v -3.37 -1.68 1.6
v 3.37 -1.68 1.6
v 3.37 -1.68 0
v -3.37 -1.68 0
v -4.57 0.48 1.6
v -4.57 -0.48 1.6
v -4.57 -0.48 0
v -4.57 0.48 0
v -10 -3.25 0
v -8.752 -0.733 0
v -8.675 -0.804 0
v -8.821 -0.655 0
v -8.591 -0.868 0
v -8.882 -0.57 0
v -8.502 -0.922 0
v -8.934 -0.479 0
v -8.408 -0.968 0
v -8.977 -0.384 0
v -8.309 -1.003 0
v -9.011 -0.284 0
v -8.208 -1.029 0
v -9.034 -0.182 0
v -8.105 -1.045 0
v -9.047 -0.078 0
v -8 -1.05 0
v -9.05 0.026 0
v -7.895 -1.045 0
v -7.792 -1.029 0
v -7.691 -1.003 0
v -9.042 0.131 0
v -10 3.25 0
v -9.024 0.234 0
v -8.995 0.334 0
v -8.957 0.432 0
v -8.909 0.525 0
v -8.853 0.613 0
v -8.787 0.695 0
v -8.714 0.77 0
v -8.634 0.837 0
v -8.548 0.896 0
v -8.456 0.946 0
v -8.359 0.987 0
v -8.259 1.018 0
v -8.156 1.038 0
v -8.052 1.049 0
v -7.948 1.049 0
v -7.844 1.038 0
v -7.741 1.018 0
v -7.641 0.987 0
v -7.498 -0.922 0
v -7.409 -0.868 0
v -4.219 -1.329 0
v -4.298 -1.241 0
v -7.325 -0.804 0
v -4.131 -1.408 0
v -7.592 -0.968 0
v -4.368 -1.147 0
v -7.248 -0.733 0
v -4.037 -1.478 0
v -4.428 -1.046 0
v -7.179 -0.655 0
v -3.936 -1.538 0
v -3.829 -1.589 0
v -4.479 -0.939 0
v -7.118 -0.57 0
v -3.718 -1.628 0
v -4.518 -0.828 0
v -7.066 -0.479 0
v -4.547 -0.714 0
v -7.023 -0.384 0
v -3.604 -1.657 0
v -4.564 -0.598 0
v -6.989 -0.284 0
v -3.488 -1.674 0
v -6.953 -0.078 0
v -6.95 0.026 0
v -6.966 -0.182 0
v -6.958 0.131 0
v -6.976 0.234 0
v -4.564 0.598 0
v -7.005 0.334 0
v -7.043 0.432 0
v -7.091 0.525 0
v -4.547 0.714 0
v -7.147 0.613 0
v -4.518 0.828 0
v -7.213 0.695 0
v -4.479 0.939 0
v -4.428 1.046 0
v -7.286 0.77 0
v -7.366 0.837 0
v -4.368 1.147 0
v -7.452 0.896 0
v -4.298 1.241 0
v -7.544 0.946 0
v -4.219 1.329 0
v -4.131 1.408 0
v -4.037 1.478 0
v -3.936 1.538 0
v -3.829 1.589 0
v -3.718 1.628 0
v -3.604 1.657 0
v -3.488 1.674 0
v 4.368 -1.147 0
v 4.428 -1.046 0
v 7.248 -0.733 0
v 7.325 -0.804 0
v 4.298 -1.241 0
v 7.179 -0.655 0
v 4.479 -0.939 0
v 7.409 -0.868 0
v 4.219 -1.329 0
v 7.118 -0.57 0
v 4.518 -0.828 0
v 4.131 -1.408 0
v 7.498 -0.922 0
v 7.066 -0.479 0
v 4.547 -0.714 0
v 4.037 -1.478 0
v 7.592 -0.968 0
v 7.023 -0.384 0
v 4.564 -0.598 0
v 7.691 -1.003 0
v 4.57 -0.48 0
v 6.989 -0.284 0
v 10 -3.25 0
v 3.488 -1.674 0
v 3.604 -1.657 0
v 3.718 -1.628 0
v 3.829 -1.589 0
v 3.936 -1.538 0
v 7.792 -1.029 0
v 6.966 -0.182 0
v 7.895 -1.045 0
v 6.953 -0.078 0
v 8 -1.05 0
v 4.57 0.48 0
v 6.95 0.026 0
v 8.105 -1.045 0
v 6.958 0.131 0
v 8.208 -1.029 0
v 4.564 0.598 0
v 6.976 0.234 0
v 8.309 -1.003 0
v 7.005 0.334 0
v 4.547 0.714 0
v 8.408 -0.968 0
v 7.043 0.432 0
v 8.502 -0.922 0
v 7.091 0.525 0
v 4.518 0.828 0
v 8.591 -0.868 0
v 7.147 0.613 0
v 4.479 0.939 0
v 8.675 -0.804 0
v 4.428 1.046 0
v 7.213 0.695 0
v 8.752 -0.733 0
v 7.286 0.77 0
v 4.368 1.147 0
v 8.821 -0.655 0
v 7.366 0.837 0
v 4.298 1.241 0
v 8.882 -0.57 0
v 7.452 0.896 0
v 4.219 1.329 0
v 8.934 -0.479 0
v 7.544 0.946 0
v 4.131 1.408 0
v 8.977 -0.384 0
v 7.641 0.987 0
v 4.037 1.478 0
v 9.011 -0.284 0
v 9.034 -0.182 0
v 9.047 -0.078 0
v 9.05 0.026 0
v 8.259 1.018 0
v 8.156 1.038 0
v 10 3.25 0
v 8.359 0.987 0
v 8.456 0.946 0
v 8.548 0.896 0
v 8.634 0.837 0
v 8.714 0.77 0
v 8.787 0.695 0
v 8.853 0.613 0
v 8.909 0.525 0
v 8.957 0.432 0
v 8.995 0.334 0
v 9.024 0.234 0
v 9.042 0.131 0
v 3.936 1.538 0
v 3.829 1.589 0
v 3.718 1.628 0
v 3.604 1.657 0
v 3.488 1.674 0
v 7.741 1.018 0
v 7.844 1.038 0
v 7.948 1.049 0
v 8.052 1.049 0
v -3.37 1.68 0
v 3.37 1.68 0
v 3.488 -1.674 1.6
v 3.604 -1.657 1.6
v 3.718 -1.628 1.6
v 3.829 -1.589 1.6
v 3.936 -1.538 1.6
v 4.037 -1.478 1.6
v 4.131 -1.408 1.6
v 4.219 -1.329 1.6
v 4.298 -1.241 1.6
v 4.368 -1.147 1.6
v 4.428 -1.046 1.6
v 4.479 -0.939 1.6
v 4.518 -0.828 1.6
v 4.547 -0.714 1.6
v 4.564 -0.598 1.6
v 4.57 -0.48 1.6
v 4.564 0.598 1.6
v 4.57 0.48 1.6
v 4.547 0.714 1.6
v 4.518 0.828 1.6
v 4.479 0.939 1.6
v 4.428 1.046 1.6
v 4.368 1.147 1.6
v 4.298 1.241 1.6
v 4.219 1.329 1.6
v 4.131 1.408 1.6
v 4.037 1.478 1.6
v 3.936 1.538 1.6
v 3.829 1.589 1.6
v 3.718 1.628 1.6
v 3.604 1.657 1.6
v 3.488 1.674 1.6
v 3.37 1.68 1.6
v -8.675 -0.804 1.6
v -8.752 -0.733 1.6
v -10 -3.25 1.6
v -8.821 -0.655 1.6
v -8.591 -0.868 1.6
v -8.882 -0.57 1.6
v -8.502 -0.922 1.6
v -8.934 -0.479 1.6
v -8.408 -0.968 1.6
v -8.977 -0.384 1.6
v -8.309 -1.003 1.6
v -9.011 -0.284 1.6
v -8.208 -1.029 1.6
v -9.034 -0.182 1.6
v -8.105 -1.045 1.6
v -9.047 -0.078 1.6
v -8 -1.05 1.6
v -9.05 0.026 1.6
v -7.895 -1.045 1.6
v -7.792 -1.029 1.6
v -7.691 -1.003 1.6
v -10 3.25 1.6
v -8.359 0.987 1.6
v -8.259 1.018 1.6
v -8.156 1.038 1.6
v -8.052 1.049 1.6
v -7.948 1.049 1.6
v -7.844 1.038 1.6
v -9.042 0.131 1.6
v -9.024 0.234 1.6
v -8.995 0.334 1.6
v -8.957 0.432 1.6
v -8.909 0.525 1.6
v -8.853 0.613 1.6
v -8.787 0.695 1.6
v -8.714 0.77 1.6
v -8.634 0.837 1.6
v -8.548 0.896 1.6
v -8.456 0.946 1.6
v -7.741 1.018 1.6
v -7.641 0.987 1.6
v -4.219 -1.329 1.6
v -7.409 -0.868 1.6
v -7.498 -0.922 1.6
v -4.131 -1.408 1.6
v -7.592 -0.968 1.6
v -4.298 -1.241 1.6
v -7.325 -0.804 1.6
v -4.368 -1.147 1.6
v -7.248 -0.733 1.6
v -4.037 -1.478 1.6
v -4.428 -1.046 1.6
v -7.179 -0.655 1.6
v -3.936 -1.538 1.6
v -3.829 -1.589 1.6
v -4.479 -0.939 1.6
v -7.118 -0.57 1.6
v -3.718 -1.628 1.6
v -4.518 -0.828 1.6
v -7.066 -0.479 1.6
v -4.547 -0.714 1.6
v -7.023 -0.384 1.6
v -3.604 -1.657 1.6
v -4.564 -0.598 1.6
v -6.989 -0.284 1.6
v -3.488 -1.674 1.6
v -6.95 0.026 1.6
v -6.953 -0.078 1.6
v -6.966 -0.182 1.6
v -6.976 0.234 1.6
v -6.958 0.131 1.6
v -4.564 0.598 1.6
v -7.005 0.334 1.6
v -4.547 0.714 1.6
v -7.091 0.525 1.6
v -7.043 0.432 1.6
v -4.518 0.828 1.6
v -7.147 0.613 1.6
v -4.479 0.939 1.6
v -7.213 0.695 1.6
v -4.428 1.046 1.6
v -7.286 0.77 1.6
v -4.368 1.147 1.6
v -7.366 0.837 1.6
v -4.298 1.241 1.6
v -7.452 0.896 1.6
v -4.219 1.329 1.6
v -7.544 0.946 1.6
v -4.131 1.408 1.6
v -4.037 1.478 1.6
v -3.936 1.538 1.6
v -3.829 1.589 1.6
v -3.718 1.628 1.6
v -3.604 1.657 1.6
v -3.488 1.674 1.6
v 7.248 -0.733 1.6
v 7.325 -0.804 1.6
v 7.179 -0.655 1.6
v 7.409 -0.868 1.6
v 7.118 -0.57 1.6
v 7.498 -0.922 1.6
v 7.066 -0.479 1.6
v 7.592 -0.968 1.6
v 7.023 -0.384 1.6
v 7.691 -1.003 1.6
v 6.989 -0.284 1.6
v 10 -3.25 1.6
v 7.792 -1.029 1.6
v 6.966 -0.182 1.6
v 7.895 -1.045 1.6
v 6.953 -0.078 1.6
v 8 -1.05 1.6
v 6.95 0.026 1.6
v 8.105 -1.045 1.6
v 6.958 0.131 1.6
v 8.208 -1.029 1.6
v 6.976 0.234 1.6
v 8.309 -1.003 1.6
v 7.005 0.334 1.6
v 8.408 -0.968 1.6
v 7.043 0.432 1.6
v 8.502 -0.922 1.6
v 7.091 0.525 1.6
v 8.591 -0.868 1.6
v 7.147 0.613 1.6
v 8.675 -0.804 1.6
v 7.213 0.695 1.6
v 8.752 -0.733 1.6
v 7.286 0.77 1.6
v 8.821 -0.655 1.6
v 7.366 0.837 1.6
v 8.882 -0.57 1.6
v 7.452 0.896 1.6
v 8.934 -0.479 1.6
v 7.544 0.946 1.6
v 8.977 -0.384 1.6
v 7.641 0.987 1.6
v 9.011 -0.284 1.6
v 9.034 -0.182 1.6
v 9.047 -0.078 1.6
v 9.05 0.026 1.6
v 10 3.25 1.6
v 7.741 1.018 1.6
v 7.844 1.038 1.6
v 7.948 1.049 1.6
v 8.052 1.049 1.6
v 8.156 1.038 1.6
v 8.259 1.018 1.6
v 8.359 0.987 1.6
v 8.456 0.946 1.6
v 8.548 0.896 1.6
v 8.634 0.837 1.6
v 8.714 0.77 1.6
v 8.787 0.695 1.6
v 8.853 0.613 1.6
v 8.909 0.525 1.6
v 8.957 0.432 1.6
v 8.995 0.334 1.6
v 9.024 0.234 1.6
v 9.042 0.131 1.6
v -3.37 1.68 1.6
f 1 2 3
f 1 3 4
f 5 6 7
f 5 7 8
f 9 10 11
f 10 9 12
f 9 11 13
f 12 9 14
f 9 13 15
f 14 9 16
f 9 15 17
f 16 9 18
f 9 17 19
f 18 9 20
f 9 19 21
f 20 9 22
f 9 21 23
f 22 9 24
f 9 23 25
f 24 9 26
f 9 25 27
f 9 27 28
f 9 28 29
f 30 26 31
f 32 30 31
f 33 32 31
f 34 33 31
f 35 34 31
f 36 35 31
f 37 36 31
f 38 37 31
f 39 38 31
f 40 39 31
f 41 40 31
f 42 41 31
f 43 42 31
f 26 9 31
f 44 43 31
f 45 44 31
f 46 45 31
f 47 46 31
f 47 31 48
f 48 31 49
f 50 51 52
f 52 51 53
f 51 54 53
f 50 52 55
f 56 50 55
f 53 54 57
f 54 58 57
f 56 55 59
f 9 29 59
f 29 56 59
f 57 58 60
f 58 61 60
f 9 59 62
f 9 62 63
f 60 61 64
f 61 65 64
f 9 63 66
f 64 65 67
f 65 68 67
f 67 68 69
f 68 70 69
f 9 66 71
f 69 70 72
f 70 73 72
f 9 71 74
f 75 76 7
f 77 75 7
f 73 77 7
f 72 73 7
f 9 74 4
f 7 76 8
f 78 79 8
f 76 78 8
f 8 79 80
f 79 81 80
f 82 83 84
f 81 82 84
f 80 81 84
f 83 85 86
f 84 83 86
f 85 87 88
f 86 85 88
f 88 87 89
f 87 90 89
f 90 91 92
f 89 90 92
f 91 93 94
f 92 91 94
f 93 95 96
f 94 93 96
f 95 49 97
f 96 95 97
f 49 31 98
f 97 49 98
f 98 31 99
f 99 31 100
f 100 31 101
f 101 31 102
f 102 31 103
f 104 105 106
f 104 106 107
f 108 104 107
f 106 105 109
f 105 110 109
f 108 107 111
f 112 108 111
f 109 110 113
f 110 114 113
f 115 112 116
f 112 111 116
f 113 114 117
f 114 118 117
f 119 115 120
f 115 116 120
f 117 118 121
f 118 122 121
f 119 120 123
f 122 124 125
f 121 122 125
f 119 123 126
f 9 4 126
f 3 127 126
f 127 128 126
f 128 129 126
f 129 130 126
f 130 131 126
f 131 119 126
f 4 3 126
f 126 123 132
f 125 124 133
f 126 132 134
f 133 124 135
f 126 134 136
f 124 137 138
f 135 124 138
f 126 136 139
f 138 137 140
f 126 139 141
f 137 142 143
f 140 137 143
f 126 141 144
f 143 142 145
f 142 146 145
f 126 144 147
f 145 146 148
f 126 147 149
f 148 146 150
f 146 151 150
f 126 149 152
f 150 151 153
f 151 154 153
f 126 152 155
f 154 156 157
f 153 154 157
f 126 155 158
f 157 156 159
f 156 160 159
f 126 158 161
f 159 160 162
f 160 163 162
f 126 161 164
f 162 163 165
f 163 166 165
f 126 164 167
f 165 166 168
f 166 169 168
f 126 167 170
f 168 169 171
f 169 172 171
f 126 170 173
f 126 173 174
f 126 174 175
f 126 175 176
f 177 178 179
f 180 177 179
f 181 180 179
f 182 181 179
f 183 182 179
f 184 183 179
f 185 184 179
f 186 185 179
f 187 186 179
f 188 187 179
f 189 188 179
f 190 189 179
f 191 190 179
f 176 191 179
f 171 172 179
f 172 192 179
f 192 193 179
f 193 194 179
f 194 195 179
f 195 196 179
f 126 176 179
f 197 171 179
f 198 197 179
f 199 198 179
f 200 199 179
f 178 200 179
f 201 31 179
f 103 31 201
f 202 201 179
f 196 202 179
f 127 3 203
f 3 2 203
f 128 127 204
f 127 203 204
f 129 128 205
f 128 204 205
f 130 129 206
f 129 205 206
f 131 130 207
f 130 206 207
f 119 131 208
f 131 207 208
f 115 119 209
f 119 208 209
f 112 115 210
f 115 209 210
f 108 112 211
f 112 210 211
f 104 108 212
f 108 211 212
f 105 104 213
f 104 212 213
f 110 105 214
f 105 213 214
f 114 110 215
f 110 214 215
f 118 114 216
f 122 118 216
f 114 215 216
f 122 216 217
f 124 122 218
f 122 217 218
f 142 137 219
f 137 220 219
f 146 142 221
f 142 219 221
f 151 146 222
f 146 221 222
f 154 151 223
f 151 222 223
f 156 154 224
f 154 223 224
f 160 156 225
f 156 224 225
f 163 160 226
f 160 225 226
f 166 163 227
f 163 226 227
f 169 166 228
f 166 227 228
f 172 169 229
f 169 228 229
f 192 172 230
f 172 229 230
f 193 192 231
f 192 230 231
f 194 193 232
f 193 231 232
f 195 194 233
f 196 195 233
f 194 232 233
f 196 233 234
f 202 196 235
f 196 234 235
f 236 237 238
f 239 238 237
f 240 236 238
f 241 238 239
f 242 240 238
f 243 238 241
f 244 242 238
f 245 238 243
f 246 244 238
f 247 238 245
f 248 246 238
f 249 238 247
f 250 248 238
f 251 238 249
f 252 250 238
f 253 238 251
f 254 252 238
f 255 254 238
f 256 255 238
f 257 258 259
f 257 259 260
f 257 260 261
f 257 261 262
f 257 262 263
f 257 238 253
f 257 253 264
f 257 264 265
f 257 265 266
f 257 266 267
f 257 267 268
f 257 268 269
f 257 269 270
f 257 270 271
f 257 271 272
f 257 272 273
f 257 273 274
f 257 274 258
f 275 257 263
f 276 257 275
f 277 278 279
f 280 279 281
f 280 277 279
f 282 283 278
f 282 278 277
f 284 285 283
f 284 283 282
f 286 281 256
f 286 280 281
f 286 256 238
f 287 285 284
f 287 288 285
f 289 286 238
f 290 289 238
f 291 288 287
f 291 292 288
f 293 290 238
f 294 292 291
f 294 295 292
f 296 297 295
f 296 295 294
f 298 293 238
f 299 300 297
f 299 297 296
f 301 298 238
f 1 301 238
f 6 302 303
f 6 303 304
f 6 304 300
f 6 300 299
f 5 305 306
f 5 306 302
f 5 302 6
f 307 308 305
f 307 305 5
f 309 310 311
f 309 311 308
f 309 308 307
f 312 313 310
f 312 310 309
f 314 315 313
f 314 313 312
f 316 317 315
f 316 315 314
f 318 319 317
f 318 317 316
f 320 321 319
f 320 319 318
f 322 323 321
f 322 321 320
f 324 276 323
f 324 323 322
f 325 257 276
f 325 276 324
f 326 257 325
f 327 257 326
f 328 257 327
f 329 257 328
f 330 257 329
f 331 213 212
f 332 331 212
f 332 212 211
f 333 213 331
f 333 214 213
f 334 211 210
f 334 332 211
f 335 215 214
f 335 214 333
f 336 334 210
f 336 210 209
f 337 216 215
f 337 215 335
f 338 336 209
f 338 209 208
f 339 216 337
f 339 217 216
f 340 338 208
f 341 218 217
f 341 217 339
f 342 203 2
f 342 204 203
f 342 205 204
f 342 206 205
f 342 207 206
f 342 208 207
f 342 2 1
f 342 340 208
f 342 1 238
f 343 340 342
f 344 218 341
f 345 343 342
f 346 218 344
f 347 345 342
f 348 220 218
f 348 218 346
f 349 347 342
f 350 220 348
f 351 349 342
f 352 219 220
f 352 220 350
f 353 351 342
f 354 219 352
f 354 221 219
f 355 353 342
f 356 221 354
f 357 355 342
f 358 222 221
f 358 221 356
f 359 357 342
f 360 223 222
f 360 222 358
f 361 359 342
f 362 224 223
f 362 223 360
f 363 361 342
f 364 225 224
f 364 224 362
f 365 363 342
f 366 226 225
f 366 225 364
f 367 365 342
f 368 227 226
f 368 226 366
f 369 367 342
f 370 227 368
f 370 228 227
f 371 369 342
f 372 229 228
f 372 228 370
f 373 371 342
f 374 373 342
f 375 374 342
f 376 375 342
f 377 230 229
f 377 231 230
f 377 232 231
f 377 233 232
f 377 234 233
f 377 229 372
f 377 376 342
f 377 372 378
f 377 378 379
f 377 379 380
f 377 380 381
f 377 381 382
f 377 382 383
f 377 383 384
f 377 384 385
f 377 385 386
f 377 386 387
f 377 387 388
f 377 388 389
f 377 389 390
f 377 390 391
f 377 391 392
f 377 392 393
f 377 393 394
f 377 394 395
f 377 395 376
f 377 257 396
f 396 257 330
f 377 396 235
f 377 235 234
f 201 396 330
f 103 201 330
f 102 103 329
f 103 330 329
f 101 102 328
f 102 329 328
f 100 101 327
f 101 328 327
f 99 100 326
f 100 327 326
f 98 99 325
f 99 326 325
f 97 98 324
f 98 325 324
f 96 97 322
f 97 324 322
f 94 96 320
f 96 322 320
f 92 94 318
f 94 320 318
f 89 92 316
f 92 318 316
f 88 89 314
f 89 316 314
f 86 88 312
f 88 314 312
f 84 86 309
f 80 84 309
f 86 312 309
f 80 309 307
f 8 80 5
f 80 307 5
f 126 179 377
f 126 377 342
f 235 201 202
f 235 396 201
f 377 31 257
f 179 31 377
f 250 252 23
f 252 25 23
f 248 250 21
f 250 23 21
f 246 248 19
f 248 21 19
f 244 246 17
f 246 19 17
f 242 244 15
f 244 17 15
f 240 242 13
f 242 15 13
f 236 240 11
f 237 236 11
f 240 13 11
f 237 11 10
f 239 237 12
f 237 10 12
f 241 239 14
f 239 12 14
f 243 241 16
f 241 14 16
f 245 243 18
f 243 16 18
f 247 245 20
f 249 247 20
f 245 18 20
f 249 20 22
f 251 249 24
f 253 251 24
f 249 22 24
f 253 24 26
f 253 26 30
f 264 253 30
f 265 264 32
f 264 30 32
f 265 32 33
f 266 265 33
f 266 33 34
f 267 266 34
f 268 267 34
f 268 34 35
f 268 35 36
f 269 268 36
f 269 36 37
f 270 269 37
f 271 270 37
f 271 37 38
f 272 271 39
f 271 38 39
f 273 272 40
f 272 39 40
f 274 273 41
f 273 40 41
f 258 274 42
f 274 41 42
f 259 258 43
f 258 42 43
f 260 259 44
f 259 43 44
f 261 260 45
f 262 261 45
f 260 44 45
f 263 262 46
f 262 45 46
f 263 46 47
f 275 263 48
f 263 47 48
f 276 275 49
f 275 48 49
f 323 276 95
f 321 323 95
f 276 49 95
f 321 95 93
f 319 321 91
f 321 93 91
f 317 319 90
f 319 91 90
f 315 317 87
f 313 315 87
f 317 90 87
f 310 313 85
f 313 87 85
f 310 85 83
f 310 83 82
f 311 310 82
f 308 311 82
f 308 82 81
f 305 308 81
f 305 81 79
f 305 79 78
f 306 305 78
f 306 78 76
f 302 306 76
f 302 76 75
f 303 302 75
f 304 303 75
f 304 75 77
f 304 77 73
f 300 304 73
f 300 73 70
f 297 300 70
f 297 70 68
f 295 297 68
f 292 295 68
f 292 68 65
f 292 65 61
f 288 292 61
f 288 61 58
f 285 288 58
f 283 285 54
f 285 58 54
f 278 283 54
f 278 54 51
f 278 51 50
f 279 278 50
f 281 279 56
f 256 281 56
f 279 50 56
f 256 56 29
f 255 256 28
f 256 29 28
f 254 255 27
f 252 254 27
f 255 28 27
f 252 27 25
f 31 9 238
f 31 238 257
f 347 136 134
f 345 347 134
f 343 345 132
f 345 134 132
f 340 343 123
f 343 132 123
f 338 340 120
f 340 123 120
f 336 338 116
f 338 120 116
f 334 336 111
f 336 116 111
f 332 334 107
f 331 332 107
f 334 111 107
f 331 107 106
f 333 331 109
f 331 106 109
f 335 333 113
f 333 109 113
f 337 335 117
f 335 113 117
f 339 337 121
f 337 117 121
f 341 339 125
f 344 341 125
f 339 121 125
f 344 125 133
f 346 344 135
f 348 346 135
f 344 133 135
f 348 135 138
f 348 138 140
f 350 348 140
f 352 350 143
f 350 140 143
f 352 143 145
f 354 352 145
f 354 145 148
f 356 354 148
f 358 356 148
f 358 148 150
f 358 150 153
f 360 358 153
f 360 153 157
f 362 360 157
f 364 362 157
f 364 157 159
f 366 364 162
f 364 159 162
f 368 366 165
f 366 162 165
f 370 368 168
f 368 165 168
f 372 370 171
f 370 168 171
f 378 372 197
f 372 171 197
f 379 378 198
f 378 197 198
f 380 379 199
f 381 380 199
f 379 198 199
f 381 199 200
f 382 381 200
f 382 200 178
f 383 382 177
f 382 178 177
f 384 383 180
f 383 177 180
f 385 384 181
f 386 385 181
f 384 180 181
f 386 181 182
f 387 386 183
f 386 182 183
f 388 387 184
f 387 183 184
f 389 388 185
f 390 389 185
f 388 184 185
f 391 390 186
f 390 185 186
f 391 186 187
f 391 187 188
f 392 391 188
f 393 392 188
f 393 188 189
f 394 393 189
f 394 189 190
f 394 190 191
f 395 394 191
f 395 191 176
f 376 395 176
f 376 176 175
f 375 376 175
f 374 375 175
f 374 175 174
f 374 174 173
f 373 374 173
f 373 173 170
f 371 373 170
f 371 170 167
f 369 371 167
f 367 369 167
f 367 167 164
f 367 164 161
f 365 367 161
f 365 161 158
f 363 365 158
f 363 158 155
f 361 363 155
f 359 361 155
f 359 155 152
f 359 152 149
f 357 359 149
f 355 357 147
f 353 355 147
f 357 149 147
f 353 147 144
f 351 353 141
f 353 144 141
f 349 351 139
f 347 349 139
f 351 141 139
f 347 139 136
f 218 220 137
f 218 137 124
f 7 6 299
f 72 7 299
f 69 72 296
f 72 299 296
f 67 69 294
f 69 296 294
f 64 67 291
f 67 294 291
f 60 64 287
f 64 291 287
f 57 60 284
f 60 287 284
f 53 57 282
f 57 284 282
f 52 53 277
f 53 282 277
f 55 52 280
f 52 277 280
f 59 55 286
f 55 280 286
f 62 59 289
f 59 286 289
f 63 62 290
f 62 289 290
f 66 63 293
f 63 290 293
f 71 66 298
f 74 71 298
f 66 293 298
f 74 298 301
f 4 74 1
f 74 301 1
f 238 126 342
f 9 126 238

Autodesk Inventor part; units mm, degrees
ref_plane "YZ Plane" through (0, 0, 0) normal (1, 0, 0) x (0, 1, 0)
ref_plane "XZ Plane" through (0, 0, 0) normal (0, 1, 0) x (-1, 0, 0)
ref_plane "XY Plane" through (0, 0, 0) normal (0, 0, 1) x (1, 0, 0)
sketch "Sketch1" plane through (0, 0, 0) normal (0, 0, 1) x (1, 0, 0)
  line L0 (-10, 3.25) -> (10, 3.25)
  line L1 (10, 3.25) -> (10, -3.25)
  line L2 (10, -3.25) -> (-10, -3.25)
  line L3 (-10, -3.25) -> (-10, 3.25)
  line L4 (-10, 3.25) -> (10, -3.25) construction
  line L5 (10, 3.25) -> (-10, -3.25) construction
  point P0 (0, 0)
  dimension "d0" = 20
  dimension "d1" = 6.5
extrude "Extrusion1" add sketch "Sketch1" along normal blind 1.6
sketch "Sketch2" plane through (0, 0, 1.6) normal (0, 0, 1) x (1, 0, 0)
  line L0 (10, -3.25) -> (10, 3.25) projected
  line L1 (-10, 3.25) -> (-10, -3.25) projected
  line L2 (10, 3.25) -> (-10, 3.25) projected
  point P0 (0, 0)
  point P1 (-8, 0)
  point P2 (8, 0)
  dimension "d4" = 2
  dimension "d5" = 2
  dimension "d6" = 3.25
  dimension "d7" = 3.25
hole "Hole1" at (-8, 0, 1.6) at (8, 0, 1.6) direction (0, 0, -1) diameter 2.1 end through all
sketch "Sketch3" plane through (0, 0, 1.6) normal (0, 0, 1) x (1, 0, 0)
  line L0 (-3.37, 1.68) -> (3.37, 1.68)
  line L1 (4.57, 0.48) -> (4.57, -0.48)
  line L2 (3.37, -1.68) -> (-3.37, -1.68)
  line L3 (-4.57, -0.48) -> (-4.57, 0.48)
  line L4 (-4.57, 1.68) -> (4.57, -1.68) construction
  line L5 (4.57, 1.68) -> (-4.57, -1.68) construction
  arc A0 (-3.37, 1.68) -> (-4.57, 0.48) centre (-3.37, 0.48) ccw
  arc A1 (4.57, 0.48) -> (3.37, 1.68) centre (3.37, 0.48) ccw
  arc A2 (3.37, -1.68) -> (4.57, -0.48) centre (3.37, -0.48) ccw
  arc A3 (-4.57, -0.48) -> (-3.37, -1.68) centre (-3.37, -0.48) ccw
  point P0 (0, 0)
  point P1 (-4.57, 0)
  point P2 (4.57, 0)
  dimension "d15" = 9.14
  dimension "d16" = 3.36
  dimension "d17" = 1.2
extrude "Extrusion2" cut sketch "Sketch3" against normal blind 1.6
properties part number "USB-C_face_plate"
